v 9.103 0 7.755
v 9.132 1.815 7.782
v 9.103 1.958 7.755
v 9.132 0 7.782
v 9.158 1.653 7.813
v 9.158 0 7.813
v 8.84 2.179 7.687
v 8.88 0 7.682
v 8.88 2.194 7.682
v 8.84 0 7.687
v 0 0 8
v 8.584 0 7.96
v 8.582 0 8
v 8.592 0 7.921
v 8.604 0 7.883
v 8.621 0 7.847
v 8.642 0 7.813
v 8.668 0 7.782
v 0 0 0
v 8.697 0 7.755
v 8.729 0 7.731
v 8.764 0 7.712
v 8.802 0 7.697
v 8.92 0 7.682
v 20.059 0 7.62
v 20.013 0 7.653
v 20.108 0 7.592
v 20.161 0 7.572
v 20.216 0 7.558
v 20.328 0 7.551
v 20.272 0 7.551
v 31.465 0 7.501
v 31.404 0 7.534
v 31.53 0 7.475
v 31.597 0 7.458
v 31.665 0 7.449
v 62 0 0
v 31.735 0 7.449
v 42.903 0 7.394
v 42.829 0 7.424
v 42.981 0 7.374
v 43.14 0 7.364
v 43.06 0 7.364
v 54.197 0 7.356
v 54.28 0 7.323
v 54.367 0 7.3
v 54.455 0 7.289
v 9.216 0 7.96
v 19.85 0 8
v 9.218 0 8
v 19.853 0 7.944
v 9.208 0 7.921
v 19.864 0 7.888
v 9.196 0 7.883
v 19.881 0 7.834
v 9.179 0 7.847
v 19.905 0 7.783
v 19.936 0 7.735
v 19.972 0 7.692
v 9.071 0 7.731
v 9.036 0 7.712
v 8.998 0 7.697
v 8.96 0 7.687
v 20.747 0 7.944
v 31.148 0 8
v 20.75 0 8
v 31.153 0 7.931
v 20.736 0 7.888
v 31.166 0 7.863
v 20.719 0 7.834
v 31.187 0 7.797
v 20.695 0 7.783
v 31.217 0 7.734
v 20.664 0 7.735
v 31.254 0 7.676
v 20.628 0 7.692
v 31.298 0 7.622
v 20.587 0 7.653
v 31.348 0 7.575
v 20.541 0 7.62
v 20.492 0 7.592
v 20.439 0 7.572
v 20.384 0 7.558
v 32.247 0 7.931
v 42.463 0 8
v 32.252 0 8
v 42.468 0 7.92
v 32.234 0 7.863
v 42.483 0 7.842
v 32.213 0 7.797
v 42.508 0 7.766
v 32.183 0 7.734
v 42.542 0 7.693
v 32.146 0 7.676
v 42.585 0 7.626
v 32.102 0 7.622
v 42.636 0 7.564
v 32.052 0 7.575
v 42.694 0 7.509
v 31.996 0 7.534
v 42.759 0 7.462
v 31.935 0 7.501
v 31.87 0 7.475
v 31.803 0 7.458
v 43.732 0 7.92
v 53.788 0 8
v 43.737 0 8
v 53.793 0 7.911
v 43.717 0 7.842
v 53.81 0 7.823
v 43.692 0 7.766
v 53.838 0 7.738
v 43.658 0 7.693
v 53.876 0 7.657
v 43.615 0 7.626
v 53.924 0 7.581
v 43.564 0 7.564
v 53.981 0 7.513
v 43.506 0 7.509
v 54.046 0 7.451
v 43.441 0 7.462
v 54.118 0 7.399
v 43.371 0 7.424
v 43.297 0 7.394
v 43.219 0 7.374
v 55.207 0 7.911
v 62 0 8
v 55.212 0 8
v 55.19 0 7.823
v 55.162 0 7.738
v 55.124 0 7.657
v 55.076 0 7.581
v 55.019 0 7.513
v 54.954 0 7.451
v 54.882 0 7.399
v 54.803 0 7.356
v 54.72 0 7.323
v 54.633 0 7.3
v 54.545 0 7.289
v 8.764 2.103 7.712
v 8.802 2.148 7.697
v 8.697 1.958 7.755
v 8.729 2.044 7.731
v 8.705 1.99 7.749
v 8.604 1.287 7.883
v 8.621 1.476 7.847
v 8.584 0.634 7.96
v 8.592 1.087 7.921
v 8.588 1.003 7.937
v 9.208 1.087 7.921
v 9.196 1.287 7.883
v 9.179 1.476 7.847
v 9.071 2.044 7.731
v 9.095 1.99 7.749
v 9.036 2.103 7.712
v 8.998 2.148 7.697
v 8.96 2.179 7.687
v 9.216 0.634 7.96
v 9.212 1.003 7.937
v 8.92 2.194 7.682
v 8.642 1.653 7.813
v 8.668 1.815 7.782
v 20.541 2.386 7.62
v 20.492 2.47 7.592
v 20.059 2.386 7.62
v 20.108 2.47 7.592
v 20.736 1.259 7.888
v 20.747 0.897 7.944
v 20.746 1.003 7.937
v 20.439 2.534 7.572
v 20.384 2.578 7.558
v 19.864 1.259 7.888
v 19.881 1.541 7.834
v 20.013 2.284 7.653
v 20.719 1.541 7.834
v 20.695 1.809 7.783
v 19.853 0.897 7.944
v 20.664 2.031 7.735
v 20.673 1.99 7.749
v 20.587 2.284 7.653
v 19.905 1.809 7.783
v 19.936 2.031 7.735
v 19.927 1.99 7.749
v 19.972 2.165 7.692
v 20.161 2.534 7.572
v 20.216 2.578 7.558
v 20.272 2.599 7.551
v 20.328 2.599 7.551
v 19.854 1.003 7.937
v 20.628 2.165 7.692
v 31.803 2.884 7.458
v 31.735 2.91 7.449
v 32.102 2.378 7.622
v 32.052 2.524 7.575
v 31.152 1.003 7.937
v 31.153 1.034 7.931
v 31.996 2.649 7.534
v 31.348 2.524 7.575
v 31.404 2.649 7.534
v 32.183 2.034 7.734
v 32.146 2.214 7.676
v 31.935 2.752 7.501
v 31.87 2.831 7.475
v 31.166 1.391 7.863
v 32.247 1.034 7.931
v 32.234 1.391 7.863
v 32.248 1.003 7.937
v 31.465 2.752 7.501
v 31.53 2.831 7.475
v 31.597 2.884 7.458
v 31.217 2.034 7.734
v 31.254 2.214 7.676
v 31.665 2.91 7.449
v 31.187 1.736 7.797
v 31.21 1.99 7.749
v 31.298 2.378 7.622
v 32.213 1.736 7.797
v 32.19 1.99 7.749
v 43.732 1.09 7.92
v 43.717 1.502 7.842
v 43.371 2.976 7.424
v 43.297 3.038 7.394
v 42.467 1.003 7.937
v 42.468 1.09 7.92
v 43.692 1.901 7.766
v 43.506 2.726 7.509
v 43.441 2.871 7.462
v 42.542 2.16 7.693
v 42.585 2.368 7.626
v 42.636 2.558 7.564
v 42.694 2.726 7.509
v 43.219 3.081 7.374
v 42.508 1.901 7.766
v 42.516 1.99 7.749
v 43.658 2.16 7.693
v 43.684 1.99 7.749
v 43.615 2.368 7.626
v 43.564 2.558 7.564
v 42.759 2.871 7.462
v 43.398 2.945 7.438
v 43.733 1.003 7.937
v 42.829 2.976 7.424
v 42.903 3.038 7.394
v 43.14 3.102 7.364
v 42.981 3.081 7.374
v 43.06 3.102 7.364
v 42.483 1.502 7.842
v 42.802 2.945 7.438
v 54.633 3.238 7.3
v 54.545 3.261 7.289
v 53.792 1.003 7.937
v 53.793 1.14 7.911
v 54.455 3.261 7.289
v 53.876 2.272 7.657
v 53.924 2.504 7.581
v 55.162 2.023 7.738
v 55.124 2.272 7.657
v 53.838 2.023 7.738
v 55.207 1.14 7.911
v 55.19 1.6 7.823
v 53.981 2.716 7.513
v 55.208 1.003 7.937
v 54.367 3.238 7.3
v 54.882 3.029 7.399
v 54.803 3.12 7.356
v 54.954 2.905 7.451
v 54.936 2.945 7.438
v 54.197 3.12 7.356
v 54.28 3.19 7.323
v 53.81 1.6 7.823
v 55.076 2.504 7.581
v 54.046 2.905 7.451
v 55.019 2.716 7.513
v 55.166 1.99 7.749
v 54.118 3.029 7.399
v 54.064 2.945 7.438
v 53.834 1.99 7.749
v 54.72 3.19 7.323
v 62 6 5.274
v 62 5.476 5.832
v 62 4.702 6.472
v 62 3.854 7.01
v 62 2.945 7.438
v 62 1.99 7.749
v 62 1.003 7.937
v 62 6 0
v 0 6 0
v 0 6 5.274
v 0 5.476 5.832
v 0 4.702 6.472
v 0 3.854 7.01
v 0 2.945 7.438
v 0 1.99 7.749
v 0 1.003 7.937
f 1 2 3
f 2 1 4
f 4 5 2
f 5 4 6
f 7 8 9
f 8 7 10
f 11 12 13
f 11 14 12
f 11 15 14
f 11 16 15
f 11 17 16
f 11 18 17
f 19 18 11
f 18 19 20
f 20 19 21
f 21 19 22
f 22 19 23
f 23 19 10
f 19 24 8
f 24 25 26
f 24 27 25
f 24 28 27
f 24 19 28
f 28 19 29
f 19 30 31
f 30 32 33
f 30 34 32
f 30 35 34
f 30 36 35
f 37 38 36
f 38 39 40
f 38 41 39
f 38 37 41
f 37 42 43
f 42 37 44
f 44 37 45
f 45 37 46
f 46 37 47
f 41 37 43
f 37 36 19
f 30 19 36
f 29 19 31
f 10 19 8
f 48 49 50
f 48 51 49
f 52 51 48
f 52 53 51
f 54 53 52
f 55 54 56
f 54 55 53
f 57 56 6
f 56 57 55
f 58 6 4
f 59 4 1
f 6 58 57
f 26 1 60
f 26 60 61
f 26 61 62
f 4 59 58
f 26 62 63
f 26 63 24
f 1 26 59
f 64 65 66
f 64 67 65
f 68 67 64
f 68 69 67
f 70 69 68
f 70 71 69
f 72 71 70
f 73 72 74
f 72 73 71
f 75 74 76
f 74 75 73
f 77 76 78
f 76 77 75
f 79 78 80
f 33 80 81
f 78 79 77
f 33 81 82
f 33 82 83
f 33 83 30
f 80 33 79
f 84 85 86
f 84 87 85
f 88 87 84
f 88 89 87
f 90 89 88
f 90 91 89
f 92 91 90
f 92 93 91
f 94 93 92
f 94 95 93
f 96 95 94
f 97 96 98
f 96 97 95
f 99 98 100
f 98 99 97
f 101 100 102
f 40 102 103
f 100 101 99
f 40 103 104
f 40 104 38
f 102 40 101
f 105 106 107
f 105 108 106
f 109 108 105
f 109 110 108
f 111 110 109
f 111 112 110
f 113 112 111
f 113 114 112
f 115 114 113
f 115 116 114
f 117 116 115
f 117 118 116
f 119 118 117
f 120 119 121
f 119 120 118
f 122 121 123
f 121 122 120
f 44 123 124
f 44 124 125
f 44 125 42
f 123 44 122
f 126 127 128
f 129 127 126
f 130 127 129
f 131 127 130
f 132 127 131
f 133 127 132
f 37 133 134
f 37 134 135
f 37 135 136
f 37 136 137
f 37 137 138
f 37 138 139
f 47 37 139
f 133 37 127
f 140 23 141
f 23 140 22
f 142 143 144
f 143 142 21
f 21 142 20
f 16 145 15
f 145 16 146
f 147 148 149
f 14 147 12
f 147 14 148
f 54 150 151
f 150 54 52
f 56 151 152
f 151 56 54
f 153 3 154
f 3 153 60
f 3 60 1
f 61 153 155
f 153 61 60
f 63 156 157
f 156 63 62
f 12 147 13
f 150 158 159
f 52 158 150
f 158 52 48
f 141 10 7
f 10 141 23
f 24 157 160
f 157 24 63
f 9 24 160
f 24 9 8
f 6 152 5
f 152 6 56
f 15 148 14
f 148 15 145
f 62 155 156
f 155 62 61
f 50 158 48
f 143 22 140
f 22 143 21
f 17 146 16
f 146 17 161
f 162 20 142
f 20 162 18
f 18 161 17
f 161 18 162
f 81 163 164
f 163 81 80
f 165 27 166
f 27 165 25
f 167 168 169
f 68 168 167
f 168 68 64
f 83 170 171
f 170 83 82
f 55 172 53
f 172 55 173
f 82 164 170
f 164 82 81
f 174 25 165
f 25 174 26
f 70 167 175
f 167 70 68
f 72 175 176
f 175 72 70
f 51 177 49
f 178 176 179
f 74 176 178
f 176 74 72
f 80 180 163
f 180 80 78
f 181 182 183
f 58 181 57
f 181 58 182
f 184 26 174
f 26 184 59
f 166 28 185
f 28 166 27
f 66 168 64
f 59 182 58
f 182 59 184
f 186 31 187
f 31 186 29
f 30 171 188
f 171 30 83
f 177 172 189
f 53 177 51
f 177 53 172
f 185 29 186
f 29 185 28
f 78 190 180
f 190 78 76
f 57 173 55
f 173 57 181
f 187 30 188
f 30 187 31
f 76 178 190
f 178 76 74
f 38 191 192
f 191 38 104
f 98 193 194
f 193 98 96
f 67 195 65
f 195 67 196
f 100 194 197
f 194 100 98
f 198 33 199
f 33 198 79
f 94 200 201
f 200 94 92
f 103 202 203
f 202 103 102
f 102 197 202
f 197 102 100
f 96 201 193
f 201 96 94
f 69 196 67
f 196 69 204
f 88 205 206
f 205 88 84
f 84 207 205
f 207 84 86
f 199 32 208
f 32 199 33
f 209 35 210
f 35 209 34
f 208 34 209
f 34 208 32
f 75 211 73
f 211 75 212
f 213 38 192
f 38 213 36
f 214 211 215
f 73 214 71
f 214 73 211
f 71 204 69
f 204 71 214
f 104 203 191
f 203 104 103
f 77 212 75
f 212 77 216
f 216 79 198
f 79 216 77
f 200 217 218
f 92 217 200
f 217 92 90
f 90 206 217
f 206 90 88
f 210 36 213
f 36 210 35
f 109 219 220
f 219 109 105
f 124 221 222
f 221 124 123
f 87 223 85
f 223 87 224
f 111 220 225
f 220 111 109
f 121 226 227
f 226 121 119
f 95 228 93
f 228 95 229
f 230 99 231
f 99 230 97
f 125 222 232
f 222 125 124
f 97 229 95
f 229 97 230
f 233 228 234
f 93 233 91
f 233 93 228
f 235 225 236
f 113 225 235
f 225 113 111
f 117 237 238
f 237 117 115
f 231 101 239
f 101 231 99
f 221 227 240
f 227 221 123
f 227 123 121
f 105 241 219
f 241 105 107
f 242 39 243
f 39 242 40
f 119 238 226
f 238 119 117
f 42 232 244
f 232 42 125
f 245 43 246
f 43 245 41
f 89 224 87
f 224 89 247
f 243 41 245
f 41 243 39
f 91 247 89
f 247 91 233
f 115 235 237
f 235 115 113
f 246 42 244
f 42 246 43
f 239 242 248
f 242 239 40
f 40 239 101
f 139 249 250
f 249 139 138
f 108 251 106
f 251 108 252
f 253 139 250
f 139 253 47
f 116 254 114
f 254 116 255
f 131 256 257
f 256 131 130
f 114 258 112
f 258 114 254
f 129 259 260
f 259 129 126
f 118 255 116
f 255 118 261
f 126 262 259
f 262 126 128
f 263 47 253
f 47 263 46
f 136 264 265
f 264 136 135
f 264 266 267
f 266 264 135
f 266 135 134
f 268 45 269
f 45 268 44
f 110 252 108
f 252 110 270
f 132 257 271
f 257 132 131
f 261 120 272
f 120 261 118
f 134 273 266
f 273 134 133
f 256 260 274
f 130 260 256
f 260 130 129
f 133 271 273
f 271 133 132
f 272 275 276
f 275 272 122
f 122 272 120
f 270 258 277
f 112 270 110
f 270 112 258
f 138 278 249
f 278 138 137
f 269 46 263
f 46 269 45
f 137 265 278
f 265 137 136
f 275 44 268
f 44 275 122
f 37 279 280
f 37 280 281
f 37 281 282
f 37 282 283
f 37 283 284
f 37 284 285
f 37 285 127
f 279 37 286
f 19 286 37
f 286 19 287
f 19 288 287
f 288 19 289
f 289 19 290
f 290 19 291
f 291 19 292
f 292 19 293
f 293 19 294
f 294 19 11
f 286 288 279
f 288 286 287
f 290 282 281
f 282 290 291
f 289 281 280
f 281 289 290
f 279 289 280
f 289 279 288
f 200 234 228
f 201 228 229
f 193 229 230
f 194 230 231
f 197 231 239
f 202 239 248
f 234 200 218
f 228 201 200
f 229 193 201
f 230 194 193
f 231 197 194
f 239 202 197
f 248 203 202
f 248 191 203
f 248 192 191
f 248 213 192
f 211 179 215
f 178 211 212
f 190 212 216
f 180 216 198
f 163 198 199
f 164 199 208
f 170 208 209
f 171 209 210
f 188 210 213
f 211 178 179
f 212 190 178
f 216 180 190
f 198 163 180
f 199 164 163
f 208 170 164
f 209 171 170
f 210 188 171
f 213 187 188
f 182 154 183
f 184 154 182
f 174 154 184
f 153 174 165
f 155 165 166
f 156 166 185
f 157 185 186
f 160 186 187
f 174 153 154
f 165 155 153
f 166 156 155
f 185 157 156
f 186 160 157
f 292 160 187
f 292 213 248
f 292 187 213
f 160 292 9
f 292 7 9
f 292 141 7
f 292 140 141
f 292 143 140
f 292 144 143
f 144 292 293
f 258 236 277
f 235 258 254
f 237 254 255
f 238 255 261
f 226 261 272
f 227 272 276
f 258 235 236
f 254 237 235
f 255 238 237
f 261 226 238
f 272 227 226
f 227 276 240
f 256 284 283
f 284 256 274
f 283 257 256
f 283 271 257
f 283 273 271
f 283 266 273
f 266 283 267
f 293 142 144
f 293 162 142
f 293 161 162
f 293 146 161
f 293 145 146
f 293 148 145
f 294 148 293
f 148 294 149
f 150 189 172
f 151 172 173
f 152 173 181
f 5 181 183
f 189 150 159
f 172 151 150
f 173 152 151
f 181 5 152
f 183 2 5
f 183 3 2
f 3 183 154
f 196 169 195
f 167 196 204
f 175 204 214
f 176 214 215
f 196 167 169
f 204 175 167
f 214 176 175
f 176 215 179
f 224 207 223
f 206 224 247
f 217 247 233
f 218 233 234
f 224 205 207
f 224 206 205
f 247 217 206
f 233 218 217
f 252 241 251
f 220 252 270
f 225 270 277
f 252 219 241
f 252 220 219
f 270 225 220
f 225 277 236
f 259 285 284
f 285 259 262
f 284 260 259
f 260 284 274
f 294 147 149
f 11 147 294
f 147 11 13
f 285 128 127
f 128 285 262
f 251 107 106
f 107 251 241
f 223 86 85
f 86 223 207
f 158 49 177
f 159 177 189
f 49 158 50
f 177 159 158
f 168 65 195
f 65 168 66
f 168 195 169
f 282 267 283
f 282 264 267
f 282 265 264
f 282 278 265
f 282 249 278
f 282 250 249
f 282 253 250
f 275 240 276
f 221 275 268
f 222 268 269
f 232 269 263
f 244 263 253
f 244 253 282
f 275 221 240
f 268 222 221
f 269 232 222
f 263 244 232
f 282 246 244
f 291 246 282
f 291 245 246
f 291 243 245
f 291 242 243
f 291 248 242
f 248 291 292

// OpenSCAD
// nut 
$fn = 50;

s = 5; // number of strings
h = 8; // nut height 
w = 62; 
p = (w-s)/s; 

intersection() {
difference() {
    cube( size=[w,6,h] ); 
    for ( i=[1:s] ) {
        translate( [p*i-0.5*s,10,h] ) {
            rotate( [90,0,0] ) {
                cylinder( r=sqrt(i)/3.14, h=10);
            }
        }
    }
}

translate( [0,0,0] ) {
    rotate( [0,90,0] ) {
        cylinder( r=h, h=100 );

    }
}
}
